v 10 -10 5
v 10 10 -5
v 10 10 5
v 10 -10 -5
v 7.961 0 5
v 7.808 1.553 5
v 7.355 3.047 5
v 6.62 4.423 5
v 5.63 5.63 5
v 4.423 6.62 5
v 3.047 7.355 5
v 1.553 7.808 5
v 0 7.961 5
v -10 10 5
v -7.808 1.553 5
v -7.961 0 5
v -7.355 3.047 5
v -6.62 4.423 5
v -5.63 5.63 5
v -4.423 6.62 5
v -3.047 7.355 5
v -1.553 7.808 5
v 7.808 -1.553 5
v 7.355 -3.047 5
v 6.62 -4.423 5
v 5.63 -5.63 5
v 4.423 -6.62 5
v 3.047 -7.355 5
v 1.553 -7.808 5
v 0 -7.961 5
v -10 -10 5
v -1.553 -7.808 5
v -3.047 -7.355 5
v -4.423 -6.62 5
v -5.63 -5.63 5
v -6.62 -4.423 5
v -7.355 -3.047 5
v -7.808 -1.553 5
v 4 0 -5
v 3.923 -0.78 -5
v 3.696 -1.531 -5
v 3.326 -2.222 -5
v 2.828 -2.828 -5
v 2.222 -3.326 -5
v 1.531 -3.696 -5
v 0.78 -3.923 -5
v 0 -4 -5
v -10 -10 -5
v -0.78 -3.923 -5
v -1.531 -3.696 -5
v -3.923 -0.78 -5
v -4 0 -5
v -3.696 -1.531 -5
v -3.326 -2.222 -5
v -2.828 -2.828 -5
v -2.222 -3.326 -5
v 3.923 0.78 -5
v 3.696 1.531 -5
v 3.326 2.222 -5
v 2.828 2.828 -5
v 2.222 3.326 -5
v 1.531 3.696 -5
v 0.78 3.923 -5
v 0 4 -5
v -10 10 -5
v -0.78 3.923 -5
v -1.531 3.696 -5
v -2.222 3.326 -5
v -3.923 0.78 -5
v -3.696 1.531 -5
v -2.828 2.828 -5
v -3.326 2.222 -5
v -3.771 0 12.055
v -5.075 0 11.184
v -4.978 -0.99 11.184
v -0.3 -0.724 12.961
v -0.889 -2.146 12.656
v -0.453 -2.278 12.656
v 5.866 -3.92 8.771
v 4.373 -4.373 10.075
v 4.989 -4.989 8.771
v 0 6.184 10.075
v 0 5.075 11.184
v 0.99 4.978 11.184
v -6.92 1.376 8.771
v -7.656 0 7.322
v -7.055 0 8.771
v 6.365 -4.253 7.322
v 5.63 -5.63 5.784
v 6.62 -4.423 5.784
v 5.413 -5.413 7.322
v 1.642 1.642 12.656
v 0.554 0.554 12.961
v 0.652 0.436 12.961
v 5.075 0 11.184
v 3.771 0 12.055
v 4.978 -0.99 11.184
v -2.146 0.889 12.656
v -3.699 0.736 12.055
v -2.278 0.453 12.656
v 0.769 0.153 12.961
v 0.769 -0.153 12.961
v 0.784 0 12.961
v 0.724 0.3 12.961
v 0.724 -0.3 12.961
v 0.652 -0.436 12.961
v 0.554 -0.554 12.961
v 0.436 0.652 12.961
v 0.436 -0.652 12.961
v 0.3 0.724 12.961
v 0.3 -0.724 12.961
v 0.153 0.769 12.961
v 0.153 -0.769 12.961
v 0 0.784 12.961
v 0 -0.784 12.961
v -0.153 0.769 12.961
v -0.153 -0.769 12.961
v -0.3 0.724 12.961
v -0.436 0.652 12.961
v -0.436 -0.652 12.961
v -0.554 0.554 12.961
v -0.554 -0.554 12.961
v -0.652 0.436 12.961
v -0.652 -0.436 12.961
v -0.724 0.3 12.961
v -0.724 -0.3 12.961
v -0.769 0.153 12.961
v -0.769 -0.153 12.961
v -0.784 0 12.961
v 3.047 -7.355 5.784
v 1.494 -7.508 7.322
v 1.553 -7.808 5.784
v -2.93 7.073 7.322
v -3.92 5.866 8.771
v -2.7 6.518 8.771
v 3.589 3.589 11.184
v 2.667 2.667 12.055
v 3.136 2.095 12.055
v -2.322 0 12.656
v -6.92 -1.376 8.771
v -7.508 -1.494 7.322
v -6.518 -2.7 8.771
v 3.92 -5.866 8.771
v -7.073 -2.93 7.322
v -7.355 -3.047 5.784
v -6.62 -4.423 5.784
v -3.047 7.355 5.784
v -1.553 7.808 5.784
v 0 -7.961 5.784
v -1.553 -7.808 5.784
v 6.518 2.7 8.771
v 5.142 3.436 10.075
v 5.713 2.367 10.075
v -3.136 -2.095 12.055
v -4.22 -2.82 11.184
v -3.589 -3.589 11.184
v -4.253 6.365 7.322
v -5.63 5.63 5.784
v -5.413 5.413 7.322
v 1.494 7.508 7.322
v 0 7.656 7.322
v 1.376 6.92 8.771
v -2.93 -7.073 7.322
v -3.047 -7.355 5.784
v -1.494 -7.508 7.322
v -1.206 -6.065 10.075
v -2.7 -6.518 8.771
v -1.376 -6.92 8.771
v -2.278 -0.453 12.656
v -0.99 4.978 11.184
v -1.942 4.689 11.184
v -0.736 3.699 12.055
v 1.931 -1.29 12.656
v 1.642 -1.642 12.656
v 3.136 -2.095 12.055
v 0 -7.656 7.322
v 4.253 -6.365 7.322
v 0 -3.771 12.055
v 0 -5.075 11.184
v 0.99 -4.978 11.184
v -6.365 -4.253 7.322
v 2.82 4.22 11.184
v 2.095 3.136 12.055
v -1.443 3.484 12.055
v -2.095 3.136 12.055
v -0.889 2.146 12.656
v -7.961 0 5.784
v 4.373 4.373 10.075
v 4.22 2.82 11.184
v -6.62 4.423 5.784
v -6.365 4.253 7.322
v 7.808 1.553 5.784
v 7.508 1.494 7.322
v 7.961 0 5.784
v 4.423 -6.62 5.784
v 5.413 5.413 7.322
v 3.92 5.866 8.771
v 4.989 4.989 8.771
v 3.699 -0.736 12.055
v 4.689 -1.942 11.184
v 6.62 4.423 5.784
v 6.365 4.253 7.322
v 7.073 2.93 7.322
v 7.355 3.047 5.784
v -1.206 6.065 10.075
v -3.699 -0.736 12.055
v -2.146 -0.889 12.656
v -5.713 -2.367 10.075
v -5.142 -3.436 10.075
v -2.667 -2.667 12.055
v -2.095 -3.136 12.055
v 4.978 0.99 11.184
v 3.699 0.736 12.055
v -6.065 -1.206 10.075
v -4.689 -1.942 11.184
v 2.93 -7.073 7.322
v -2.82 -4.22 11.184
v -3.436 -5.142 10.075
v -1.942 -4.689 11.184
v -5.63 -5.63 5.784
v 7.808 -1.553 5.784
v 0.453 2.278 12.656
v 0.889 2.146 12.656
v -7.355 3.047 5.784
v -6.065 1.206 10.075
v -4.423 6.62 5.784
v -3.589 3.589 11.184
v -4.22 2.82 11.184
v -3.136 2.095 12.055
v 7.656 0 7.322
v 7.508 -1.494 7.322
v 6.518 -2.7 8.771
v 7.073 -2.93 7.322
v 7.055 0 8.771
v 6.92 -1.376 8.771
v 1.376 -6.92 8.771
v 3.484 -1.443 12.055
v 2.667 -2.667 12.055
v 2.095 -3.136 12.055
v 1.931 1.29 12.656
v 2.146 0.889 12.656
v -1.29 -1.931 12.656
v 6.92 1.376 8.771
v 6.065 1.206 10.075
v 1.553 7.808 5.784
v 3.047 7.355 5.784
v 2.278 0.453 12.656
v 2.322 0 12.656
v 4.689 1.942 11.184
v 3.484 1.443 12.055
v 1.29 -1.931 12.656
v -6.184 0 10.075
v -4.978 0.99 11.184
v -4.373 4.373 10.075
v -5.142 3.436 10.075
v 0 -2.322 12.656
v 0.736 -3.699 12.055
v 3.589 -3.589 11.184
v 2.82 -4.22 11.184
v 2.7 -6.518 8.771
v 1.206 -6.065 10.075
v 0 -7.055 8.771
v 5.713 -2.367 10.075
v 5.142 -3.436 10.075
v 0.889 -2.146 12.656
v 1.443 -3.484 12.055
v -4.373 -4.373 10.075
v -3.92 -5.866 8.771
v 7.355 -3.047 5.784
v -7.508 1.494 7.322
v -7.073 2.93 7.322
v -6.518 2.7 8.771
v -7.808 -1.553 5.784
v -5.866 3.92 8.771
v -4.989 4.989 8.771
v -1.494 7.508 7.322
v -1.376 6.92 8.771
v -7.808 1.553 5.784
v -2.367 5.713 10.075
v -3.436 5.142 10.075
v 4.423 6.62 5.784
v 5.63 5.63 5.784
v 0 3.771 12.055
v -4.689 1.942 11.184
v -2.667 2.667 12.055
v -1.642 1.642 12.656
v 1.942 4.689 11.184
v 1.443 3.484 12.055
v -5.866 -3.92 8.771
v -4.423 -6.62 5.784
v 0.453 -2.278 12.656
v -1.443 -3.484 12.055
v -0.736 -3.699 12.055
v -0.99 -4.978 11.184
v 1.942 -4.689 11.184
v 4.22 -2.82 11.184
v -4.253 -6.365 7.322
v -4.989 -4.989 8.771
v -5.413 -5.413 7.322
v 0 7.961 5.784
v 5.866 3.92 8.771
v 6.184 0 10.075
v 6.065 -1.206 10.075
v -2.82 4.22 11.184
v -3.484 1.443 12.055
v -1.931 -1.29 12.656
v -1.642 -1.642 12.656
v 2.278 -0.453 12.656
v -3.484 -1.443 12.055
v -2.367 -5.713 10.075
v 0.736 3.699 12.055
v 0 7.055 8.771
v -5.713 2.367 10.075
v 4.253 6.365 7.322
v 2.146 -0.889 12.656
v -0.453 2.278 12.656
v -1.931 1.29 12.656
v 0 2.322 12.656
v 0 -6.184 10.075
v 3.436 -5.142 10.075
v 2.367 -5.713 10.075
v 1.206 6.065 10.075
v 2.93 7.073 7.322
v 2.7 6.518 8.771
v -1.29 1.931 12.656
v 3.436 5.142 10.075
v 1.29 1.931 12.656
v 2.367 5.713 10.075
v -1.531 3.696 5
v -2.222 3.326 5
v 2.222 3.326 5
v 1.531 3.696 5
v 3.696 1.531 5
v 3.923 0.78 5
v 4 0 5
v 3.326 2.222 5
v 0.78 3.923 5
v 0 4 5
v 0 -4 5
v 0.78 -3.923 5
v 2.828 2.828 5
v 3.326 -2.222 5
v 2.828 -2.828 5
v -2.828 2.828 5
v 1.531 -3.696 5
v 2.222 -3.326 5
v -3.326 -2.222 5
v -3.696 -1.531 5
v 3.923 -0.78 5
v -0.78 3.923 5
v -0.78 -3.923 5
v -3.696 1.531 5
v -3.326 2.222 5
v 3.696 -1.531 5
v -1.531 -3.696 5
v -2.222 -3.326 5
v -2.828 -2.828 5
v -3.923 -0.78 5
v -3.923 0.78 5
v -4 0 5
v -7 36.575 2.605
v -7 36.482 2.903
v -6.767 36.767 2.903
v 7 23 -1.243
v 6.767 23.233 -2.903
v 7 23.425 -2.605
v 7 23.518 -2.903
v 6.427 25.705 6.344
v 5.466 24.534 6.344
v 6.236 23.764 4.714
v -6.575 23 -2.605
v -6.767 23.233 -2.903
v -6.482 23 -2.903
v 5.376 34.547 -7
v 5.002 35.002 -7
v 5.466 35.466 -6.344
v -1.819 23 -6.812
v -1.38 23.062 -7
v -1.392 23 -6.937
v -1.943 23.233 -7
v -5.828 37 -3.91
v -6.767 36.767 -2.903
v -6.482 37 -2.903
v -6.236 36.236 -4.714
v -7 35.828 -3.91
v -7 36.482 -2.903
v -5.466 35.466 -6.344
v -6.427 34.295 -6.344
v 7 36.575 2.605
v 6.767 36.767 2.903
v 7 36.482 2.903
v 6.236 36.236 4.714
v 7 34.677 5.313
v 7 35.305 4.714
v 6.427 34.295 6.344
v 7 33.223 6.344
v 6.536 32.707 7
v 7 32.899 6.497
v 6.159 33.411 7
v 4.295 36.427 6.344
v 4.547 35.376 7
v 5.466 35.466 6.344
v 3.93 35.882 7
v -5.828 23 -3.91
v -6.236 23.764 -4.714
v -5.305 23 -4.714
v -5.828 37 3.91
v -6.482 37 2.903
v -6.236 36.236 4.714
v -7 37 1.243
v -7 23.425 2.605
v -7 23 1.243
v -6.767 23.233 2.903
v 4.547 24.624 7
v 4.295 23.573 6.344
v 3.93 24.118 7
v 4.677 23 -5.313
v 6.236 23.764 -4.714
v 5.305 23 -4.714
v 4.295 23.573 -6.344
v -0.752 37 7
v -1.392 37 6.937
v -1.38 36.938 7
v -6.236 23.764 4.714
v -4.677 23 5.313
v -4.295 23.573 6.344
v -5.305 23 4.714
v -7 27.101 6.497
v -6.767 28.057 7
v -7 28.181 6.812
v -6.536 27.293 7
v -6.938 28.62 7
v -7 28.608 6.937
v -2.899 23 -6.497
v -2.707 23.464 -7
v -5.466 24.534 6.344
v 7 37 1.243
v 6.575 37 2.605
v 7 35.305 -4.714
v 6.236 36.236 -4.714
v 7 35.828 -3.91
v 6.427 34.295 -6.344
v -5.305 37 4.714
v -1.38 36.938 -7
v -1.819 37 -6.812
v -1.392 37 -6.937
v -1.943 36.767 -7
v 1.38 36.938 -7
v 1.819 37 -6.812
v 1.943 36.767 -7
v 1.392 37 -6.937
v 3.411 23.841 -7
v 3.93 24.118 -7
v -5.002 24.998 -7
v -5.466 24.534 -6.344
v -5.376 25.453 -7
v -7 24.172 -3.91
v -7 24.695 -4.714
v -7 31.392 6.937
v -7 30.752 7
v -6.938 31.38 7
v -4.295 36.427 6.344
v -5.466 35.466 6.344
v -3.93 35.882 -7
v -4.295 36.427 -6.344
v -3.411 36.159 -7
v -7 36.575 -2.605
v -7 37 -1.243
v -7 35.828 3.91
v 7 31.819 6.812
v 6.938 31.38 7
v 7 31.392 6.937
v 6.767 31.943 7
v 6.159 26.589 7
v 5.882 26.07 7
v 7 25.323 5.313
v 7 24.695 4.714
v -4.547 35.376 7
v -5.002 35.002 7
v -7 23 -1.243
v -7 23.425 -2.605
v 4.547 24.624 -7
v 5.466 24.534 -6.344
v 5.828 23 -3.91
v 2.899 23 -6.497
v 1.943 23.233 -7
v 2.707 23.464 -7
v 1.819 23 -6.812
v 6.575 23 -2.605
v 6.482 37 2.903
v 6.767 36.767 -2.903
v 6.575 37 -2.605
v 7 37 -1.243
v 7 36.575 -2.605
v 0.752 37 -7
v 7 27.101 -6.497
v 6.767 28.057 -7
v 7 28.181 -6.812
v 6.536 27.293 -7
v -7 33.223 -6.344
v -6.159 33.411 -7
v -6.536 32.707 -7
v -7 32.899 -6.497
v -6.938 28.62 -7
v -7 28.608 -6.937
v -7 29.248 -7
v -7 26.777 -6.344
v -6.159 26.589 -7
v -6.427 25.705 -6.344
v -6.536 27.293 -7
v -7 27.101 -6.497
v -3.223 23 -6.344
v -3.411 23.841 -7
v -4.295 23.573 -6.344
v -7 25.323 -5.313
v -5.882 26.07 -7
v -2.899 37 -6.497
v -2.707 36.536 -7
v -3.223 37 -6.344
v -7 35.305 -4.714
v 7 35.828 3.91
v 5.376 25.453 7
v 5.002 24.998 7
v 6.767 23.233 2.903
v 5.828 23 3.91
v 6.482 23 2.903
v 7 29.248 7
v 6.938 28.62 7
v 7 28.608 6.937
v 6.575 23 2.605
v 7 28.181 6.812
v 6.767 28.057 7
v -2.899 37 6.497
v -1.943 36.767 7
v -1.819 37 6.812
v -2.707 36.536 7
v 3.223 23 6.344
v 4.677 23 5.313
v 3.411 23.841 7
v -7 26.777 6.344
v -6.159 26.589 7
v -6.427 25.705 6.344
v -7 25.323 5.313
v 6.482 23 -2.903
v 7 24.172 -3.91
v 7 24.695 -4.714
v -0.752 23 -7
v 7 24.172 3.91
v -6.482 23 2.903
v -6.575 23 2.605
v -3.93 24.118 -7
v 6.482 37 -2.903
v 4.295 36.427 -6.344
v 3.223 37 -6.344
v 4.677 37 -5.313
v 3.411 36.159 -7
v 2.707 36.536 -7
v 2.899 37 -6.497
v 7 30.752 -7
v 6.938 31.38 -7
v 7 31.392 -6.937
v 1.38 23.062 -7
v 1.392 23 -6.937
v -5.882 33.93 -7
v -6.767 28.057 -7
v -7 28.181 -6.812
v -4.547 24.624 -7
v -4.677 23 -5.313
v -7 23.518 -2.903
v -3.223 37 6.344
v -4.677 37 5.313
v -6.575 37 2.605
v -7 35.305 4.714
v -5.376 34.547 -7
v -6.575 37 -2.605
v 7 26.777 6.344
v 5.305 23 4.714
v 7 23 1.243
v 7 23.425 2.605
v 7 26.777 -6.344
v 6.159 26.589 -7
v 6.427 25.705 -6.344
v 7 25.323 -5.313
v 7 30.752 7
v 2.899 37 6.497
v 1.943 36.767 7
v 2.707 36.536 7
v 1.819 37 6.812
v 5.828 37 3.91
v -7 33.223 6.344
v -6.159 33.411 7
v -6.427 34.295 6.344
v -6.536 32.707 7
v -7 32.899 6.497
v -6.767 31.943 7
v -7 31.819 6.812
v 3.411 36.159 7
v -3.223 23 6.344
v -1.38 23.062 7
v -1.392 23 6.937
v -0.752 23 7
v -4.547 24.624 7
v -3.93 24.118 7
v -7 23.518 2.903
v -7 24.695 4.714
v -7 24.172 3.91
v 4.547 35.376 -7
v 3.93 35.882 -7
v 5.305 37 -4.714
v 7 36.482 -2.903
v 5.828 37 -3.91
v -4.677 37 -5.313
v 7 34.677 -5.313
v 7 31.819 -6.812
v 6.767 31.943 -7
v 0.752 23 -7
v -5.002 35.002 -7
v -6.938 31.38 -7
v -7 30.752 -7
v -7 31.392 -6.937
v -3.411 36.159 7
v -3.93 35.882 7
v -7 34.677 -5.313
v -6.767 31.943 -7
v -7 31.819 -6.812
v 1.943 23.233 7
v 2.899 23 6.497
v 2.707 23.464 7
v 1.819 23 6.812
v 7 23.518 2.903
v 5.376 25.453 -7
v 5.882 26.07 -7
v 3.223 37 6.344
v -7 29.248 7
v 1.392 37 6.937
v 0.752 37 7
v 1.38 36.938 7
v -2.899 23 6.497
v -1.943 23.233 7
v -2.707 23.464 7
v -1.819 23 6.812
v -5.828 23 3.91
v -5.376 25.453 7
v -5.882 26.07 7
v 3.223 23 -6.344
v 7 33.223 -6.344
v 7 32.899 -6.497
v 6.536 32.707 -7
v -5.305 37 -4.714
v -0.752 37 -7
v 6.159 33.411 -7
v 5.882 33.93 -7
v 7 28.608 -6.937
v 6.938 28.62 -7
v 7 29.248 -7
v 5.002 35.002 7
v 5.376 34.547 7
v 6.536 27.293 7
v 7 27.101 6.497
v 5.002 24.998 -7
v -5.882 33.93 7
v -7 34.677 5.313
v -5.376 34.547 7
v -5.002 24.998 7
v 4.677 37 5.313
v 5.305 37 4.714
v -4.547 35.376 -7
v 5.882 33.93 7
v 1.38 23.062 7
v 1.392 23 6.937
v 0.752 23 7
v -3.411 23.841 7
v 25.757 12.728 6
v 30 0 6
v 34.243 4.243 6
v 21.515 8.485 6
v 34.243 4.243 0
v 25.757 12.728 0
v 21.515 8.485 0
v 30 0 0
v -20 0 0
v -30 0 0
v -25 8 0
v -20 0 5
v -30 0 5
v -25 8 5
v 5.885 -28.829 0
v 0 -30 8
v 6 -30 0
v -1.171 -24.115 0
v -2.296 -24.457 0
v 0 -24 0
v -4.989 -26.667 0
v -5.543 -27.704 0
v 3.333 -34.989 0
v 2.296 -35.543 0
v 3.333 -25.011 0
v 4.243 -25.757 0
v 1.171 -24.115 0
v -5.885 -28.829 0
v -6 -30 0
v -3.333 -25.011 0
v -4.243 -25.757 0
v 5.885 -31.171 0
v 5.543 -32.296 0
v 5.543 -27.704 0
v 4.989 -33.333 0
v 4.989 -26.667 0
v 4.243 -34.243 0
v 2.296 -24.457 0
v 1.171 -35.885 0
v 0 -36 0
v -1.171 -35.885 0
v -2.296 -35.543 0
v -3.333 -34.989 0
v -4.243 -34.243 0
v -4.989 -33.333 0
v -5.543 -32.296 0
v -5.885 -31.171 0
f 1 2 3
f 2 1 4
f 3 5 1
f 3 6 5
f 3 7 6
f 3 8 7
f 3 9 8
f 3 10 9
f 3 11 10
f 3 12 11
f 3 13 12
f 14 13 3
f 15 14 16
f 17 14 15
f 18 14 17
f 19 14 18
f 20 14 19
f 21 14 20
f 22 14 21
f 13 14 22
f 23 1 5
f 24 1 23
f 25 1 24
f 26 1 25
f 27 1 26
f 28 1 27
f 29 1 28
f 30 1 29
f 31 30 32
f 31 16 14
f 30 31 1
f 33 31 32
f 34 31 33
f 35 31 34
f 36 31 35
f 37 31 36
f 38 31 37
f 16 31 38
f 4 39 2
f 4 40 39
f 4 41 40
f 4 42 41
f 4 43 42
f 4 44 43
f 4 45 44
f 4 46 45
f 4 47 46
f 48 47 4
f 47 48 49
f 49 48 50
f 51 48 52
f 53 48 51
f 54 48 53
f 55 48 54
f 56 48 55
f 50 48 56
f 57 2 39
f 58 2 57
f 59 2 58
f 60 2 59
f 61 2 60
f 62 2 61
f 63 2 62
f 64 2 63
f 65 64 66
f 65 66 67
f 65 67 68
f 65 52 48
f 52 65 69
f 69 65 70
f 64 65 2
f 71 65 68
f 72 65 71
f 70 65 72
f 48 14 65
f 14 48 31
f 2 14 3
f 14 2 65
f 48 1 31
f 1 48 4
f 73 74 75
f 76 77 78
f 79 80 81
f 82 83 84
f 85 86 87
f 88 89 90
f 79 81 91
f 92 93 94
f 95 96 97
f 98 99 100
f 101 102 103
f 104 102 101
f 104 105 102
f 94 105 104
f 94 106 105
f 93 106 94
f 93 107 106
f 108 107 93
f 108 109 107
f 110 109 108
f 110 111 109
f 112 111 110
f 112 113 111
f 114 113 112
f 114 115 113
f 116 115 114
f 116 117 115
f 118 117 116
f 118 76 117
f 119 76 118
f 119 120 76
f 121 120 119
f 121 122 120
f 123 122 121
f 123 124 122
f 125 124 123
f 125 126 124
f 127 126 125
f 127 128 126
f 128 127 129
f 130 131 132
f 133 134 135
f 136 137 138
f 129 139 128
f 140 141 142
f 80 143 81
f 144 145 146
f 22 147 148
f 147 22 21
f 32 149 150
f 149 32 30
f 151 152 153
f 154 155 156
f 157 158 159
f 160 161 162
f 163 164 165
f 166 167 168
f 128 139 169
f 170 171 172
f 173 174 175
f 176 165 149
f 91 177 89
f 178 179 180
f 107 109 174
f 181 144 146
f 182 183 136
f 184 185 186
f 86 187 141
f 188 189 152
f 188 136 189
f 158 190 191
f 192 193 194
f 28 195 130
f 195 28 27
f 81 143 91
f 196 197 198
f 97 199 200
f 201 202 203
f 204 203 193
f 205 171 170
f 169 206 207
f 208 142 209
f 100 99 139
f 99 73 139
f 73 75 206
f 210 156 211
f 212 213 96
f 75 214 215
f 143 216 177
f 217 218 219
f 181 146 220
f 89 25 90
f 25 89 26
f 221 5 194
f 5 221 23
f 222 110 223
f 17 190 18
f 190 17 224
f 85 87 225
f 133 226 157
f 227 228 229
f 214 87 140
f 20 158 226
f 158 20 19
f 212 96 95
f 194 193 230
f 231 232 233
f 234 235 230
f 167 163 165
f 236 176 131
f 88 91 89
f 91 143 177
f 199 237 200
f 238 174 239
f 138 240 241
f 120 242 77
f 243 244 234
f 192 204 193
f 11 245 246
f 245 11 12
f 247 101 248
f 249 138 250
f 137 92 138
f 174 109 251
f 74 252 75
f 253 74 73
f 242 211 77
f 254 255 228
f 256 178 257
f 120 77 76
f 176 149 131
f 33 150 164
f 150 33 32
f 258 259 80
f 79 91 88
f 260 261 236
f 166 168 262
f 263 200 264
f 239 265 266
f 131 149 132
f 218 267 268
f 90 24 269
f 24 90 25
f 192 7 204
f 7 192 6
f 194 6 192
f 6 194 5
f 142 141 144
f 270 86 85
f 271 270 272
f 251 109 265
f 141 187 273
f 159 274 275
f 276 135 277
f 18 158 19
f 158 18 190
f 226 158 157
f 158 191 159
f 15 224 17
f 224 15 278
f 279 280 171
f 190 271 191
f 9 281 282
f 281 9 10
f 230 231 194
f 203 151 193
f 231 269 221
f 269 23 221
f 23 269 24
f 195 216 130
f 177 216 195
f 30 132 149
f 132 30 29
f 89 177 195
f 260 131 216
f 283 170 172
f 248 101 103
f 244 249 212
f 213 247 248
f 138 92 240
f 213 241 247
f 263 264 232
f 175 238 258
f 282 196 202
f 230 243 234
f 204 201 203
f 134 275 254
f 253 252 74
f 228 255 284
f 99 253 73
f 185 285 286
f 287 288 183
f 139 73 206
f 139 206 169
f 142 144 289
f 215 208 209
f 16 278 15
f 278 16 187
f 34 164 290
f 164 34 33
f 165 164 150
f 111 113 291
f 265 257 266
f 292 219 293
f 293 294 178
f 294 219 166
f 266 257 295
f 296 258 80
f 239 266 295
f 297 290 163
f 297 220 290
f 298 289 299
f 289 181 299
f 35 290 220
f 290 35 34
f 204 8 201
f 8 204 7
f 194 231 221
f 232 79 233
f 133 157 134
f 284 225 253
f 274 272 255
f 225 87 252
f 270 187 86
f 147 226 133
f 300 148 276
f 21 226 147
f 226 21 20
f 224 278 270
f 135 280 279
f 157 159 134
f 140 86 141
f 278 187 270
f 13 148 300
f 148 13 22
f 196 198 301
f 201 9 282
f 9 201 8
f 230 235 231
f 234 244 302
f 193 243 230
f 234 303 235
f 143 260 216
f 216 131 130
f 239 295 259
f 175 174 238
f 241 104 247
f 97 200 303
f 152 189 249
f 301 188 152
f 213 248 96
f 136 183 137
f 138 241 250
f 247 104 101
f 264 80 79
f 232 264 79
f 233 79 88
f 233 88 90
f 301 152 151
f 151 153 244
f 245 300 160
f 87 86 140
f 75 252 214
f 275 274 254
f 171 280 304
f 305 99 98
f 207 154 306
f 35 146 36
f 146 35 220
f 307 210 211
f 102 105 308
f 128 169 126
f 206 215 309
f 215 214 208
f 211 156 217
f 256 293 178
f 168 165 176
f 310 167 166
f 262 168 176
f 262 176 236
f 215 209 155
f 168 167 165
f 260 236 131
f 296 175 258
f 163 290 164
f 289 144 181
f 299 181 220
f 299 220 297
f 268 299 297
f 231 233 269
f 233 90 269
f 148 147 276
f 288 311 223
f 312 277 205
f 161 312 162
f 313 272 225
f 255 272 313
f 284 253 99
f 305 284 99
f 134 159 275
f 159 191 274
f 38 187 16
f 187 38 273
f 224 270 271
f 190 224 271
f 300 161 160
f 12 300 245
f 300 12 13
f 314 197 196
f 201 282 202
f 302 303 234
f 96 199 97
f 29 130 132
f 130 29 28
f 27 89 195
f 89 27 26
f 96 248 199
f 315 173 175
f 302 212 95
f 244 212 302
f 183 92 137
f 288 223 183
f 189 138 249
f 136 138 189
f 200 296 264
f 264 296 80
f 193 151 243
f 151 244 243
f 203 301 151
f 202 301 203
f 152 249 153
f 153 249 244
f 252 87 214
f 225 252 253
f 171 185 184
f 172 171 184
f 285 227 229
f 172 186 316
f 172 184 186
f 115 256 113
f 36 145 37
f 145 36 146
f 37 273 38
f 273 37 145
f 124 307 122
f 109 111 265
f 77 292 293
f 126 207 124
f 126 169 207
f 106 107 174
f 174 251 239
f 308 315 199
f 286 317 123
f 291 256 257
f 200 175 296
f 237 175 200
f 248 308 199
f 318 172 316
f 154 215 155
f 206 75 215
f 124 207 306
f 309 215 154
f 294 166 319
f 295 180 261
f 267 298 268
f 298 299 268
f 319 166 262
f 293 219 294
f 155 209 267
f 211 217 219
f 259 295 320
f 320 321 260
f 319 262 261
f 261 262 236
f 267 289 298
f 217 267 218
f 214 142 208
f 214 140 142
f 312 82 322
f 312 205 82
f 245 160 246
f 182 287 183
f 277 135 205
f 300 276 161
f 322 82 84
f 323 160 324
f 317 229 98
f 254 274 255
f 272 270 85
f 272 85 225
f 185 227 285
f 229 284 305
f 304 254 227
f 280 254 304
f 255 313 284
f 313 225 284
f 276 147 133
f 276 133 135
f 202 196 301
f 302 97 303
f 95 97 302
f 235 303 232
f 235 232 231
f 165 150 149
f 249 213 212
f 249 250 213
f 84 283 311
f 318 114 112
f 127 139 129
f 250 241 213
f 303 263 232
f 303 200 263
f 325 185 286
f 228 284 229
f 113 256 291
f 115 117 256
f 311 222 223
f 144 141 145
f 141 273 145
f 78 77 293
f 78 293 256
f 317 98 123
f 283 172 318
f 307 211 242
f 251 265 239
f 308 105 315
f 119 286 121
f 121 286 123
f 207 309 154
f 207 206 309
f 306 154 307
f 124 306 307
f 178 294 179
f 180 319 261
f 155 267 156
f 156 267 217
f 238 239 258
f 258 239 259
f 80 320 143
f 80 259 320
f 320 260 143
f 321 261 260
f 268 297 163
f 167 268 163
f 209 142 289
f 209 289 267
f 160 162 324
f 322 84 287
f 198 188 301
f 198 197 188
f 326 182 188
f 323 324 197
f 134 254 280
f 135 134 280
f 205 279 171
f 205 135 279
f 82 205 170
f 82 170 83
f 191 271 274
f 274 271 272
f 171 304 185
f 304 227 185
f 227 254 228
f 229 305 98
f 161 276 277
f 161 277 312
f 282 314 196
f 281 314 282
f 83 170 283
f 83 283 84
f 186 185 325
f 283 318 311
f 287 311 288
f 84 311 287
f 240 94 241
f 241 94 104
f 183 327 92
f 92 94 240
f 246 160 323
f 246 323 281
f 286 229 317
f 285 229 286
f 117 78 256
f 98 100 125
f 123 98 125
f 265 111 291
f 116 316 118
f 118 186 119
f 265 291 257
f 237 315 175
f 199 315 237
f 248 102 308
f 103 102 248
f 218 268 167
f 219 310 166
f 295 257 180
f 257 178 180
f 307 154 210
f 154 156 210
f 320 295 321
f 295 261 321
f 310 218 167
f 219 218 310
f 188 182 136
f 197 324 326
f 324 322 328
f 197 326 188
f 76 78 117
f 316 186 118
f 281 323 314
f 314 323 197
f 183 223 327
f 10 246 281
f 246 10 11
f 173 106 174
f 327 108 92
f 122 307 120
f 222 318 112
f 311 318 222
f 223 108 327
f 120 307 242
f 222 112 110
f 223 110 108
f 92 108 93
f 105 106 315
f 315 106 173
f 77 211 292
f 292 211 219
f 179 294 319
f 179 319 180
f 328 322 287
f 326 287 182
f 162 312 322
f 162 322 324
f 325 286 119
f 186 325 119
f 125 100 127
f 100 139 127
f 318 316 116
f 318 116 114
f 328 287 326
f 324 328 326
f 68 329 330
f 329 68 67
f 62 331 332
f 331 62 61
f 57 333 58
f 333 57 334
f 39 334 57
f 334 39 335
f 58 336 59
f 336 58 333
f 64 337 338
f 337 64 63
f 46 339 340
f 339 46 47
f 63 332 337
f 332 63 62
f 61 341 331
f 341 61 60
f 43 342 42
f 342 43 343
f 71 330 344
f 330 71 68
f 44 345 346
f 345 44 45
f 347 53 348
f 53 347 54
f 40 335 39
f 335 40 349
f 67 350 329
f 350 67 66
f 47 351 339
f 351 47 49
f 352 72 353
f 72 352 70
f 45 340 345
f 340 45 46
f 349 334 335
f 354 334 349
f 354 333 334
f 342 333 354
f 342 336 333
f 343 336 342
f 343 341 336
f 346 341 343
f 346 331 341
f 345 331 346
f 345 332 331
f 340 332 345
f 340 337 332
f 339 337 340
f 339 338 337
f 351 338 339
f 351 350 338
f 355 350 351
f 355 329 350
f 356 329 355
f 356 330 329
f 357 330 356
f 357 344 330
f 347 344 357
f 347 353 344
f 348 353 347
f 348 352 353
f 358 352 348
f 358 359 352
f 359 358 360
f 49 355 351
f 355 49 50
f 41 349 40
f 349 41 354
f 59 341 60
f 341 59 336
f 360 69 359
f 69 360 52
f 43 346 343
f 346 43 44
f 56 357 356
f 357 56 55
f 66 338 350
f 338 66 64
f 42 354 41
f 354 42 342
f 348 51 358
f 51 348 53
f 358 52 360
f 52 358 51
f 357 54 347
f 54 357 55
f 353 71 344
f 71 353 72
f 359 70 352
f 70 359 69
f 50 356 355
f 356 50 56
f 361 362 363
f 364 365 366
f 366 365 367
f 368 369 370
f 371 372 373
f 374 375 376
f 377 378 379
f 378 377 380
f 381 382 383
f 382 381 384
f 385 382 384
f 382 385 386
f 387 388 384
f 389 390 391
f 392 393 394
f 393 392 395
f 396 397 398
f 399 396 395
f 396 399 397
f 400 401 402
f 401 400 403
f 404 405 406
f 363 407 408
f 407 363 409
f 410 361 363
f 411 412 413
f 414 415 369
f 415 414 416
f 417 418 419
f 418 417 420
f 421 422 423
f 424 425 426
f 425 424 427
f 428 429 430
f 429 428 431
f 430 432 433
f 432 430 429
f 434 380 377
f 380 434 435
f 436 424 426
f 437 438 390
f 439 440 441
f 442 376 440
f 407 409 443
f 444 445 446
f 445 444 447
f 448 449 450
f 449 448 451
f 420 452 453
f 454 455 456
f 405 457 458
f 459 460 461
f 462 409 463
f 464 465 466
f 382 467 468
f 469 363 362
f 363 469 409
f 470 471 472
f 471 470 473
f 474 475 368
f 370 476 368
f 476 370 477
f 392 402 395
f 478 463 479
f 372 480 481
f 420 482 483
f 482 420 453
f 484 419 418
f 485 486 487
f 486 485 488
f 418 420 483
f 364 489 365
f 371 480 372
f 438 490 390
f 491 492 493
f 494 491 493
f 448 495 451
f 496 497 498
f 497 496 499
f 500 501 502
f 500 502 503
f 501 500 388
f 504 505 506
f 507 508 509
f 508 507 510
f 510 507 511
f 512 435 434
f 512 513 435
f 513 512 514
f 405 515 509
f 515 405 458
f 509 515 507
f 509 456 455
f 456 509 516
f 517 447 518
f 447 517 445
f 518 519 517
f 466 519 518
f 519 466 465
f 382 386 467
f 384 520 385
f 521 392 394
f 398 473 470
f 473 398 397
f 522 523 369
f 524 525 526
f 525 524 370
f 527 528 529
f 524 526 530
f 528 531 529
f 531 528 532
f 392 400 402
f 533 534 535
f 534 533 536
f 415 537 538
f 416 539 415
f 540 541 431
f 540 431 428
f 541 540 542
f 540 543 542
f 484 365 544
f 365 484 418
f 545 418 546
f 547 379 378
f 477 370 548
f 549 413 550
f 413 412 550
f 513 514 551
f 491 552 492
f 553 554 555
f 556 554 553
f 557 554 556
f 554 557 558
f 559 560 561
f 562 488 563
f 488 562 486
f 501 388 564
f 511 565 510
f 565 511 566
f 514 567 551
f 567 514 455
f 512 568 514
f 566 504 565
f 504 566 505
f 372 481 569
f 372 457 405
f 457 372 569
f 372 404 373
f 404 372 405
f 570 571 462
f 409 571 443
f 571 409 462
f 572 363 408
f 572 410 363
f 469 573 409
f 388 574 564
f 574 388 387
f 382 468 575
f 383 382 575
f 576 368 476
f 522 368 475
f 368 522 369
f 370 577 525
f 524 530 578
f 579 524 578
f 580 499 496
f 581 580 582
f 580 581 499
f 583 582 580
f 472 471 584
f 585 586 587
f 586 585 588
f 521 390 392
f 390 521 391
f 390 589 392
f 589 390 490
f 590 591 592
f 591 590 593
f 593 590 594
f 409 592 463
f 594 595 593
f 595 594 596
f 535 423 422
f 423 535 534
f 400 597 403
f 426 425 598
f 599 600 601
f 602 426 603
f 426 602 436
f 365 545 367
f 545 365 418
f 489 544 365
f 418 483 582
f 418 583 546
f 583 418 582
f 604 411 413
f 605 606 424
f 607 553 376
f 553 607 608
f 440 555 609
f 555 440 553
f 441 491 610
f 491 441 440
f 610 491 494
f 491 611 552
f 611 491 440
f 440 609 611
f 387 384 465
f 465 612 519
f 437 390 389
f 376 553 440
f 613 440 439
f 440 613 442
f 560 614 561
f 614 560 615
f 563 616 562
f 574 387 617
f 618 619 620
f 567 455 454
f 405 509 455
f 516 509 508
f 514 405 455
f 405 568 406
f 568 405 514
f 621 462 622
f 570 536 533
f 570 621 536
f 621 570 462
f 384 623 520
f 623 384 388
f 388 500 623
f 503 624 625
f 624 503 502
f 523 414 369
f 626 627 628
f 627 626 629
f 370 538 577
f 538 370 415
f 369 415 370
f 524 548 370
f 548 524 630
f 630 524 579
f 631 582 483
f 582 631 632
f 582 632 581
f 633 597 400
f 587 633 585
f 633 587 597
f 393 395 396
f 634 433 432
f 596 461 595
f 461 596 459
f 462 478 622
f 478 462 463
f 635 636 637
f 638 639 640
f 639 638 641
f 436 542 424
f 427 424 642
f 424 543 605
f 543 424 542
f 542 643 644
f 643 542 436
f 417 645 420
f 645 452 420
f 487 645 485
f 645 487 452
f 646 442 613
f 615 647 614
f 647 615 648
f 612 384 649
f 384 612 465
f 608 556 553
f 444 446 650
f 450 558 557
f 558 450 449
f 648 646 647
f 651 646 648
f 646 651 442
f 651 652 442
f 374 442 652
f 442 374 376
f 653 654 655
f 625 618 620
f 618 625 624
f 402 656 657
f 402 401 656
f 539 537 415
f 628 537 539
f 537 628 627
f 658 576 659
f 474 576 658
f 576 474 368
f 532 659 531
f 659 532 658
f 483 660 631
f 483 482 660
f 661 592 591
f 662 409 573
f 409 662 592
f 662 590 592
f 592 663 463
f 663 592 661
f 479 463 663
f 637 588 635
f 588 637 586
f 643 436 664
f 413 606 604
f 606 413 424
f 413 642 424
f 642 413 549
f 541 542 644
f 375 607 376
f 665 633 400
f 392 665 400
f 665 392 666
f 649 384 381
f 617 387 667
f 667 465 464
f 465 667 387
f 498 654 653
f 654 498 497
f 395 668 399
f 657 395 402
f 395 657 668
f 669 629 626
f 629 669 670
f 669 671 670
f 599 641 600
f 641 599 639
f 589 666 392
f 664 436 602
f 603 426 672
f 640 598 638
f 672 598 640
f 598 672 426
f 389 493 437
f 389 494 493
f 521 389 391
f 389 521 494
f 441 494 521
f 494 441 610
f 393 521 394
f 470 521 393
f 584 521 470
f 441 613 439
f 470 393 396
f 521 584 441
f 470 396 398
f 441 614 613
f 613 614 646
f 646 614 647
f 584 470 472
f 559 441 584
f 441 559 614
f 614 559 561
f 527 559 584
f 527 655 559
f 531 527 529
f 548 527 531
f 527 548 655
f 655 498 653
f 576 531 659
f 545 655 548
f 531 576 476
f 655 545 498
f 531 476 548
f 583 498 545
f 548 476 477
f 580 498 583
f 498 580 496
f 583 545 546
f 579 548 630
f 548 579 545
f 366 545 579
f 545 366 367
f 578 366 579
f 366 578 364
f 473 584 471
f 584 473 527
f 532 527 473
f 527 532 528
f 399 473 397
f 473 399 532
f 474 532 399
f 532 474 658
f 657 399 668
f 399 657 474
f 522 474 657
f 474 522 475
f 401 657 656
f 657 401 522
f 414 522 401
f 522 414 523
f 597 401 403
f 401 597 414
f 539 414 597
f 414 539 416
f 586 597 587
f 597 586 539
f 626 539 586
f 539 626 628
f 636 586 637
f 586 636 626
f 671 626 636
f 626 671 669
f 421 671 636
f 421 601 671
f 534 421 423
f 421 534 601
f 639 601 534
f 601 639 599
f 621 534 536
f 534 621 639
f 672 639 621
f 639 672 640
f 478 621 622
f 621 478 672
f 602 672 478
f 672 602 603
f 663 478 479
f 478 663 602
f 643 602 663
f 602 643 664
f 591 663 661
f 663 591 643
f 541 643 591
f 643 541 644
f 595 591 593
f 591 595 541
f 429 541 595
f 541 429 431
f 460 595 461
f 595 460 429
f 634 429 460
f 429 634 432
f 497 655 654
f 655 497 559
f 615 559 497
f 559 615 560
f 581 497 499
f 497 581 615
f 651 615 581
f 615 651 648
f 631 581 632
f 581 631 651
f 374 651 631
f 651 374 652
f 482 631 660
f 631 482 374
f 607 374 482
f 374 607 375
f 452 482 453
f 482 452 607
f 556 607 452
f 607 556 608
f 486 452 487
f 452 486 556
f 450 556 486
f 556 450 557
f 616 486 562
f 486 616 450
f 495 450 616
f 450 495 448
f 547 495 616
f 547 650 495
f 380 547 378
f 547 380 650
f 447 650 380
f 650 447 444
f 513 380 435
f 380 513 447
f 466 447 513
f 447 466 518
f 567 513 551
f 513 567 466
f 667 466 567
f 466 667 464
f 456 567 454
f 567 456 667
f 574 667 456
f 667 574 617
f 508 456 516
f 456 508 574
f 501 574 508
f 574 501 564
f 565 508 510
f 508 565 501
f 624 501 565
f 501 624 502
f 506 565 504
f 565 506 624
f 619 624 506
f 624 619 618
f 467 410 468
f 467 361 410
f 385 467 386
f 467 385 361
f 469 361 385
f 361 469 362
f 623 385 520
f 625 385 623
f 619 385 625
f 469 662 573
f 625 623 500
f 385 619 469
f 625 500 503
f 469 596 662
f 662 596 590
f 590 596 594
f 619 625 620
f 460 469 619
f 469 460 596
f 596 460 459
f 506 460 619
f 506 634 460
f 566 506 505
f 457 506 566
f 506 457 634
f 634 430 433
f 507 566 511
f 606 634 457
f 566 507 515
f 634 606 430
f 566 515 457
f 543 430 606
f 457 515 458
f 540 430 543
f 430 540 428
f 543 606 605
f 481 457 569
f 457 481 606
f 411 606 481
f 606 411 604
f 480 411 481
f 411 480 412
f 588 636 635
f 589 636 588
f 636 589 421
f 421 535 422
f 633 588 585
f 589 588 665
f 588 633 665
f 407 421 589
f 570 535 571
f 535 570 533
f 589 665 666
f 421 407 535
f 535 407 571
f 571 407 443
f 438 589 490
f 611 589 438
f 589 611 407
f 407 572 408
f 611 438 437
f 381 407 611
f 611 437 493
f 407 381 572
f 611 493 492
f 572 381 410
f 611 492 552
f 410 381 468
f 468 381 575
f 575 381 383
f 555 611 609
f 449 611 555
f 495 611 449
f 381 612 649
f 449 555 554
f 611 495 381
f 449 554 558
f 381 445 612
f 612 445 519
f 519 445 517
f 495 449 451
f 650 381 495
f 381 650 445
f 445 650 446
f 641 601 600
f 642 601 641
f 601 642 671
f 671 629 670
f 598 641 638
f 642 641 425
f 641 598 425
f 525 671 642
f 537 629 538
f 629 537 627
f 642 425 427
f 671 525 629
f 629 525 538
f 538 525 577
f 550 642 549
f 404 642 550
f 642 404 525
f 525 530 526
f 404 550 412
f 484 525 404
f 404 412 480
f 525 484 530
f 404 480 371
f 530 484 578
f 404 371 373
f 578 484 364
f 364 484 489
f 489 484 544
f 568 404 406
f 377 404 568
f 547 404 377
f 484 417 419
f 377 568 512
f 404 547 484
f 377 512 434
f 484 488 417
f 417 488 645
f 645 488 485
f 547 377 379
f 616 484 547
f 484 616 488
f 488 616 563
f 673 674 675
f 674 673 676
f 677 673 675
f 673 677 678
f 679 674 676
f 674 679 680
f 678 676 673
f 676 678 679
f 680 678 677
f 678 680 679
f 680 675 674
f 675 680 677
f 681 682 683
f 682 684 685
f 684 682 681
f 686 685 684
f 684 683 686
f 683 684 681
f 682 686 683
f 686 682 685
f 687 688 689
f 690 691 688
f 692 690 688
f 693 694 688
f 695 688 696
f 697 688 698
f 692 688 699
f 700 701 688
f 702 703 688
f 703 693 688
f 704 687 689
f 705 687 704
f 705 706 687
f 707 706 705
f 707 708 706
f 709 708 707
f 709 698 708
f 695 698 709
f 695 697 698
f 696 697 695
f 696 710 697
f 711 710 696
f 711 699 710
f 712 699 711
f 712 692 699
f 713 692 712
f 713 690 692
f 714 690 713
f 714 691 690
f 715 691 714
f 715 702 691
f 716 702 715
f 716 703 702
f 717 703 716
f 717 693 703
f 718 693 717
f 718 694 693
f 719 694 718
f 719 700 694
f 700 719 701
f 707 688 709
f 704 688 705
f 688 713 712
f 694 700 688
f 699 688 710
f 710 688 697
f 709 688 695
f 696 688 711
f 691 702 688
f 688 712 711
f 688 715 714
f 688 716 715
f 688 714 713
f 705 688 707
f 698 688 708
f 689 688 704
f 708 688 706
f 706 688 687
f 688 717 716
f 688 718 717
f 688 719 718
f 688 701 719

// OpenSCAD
// Primitives, transforms, and the three boolean operators.
// Exercises: cube, sphere, cylinder (cone), 2D polygon + linear_extrude,
// translate/rotate/scale, union/difference/intersection, color, $fn.
$fn = 32;

difference() {
    union() {
        cube([20, 20, 10], center = true);
        translate([0, 0, 5]) sphere(r = 8);
    }
    translate([0, 0, -2]) cylinder(h = 14, r = 4, center = true);
}

translate([30, 0, 0]) rotate([0, 0, 45]) scale([1, 2, 1]) cube(6);

translate([-30, 0, 0]) linear_extrude(height = 5) polygon([[0,0],[10,0],[5,8]]);

translate([0, 30, 0]) intersection() {
    sphere(10);
    cube(14, center = true);
}

color("steelblue") translate([0, -30, 0]) cylinder(h = 8, r1 = 6, r2 = 0);
